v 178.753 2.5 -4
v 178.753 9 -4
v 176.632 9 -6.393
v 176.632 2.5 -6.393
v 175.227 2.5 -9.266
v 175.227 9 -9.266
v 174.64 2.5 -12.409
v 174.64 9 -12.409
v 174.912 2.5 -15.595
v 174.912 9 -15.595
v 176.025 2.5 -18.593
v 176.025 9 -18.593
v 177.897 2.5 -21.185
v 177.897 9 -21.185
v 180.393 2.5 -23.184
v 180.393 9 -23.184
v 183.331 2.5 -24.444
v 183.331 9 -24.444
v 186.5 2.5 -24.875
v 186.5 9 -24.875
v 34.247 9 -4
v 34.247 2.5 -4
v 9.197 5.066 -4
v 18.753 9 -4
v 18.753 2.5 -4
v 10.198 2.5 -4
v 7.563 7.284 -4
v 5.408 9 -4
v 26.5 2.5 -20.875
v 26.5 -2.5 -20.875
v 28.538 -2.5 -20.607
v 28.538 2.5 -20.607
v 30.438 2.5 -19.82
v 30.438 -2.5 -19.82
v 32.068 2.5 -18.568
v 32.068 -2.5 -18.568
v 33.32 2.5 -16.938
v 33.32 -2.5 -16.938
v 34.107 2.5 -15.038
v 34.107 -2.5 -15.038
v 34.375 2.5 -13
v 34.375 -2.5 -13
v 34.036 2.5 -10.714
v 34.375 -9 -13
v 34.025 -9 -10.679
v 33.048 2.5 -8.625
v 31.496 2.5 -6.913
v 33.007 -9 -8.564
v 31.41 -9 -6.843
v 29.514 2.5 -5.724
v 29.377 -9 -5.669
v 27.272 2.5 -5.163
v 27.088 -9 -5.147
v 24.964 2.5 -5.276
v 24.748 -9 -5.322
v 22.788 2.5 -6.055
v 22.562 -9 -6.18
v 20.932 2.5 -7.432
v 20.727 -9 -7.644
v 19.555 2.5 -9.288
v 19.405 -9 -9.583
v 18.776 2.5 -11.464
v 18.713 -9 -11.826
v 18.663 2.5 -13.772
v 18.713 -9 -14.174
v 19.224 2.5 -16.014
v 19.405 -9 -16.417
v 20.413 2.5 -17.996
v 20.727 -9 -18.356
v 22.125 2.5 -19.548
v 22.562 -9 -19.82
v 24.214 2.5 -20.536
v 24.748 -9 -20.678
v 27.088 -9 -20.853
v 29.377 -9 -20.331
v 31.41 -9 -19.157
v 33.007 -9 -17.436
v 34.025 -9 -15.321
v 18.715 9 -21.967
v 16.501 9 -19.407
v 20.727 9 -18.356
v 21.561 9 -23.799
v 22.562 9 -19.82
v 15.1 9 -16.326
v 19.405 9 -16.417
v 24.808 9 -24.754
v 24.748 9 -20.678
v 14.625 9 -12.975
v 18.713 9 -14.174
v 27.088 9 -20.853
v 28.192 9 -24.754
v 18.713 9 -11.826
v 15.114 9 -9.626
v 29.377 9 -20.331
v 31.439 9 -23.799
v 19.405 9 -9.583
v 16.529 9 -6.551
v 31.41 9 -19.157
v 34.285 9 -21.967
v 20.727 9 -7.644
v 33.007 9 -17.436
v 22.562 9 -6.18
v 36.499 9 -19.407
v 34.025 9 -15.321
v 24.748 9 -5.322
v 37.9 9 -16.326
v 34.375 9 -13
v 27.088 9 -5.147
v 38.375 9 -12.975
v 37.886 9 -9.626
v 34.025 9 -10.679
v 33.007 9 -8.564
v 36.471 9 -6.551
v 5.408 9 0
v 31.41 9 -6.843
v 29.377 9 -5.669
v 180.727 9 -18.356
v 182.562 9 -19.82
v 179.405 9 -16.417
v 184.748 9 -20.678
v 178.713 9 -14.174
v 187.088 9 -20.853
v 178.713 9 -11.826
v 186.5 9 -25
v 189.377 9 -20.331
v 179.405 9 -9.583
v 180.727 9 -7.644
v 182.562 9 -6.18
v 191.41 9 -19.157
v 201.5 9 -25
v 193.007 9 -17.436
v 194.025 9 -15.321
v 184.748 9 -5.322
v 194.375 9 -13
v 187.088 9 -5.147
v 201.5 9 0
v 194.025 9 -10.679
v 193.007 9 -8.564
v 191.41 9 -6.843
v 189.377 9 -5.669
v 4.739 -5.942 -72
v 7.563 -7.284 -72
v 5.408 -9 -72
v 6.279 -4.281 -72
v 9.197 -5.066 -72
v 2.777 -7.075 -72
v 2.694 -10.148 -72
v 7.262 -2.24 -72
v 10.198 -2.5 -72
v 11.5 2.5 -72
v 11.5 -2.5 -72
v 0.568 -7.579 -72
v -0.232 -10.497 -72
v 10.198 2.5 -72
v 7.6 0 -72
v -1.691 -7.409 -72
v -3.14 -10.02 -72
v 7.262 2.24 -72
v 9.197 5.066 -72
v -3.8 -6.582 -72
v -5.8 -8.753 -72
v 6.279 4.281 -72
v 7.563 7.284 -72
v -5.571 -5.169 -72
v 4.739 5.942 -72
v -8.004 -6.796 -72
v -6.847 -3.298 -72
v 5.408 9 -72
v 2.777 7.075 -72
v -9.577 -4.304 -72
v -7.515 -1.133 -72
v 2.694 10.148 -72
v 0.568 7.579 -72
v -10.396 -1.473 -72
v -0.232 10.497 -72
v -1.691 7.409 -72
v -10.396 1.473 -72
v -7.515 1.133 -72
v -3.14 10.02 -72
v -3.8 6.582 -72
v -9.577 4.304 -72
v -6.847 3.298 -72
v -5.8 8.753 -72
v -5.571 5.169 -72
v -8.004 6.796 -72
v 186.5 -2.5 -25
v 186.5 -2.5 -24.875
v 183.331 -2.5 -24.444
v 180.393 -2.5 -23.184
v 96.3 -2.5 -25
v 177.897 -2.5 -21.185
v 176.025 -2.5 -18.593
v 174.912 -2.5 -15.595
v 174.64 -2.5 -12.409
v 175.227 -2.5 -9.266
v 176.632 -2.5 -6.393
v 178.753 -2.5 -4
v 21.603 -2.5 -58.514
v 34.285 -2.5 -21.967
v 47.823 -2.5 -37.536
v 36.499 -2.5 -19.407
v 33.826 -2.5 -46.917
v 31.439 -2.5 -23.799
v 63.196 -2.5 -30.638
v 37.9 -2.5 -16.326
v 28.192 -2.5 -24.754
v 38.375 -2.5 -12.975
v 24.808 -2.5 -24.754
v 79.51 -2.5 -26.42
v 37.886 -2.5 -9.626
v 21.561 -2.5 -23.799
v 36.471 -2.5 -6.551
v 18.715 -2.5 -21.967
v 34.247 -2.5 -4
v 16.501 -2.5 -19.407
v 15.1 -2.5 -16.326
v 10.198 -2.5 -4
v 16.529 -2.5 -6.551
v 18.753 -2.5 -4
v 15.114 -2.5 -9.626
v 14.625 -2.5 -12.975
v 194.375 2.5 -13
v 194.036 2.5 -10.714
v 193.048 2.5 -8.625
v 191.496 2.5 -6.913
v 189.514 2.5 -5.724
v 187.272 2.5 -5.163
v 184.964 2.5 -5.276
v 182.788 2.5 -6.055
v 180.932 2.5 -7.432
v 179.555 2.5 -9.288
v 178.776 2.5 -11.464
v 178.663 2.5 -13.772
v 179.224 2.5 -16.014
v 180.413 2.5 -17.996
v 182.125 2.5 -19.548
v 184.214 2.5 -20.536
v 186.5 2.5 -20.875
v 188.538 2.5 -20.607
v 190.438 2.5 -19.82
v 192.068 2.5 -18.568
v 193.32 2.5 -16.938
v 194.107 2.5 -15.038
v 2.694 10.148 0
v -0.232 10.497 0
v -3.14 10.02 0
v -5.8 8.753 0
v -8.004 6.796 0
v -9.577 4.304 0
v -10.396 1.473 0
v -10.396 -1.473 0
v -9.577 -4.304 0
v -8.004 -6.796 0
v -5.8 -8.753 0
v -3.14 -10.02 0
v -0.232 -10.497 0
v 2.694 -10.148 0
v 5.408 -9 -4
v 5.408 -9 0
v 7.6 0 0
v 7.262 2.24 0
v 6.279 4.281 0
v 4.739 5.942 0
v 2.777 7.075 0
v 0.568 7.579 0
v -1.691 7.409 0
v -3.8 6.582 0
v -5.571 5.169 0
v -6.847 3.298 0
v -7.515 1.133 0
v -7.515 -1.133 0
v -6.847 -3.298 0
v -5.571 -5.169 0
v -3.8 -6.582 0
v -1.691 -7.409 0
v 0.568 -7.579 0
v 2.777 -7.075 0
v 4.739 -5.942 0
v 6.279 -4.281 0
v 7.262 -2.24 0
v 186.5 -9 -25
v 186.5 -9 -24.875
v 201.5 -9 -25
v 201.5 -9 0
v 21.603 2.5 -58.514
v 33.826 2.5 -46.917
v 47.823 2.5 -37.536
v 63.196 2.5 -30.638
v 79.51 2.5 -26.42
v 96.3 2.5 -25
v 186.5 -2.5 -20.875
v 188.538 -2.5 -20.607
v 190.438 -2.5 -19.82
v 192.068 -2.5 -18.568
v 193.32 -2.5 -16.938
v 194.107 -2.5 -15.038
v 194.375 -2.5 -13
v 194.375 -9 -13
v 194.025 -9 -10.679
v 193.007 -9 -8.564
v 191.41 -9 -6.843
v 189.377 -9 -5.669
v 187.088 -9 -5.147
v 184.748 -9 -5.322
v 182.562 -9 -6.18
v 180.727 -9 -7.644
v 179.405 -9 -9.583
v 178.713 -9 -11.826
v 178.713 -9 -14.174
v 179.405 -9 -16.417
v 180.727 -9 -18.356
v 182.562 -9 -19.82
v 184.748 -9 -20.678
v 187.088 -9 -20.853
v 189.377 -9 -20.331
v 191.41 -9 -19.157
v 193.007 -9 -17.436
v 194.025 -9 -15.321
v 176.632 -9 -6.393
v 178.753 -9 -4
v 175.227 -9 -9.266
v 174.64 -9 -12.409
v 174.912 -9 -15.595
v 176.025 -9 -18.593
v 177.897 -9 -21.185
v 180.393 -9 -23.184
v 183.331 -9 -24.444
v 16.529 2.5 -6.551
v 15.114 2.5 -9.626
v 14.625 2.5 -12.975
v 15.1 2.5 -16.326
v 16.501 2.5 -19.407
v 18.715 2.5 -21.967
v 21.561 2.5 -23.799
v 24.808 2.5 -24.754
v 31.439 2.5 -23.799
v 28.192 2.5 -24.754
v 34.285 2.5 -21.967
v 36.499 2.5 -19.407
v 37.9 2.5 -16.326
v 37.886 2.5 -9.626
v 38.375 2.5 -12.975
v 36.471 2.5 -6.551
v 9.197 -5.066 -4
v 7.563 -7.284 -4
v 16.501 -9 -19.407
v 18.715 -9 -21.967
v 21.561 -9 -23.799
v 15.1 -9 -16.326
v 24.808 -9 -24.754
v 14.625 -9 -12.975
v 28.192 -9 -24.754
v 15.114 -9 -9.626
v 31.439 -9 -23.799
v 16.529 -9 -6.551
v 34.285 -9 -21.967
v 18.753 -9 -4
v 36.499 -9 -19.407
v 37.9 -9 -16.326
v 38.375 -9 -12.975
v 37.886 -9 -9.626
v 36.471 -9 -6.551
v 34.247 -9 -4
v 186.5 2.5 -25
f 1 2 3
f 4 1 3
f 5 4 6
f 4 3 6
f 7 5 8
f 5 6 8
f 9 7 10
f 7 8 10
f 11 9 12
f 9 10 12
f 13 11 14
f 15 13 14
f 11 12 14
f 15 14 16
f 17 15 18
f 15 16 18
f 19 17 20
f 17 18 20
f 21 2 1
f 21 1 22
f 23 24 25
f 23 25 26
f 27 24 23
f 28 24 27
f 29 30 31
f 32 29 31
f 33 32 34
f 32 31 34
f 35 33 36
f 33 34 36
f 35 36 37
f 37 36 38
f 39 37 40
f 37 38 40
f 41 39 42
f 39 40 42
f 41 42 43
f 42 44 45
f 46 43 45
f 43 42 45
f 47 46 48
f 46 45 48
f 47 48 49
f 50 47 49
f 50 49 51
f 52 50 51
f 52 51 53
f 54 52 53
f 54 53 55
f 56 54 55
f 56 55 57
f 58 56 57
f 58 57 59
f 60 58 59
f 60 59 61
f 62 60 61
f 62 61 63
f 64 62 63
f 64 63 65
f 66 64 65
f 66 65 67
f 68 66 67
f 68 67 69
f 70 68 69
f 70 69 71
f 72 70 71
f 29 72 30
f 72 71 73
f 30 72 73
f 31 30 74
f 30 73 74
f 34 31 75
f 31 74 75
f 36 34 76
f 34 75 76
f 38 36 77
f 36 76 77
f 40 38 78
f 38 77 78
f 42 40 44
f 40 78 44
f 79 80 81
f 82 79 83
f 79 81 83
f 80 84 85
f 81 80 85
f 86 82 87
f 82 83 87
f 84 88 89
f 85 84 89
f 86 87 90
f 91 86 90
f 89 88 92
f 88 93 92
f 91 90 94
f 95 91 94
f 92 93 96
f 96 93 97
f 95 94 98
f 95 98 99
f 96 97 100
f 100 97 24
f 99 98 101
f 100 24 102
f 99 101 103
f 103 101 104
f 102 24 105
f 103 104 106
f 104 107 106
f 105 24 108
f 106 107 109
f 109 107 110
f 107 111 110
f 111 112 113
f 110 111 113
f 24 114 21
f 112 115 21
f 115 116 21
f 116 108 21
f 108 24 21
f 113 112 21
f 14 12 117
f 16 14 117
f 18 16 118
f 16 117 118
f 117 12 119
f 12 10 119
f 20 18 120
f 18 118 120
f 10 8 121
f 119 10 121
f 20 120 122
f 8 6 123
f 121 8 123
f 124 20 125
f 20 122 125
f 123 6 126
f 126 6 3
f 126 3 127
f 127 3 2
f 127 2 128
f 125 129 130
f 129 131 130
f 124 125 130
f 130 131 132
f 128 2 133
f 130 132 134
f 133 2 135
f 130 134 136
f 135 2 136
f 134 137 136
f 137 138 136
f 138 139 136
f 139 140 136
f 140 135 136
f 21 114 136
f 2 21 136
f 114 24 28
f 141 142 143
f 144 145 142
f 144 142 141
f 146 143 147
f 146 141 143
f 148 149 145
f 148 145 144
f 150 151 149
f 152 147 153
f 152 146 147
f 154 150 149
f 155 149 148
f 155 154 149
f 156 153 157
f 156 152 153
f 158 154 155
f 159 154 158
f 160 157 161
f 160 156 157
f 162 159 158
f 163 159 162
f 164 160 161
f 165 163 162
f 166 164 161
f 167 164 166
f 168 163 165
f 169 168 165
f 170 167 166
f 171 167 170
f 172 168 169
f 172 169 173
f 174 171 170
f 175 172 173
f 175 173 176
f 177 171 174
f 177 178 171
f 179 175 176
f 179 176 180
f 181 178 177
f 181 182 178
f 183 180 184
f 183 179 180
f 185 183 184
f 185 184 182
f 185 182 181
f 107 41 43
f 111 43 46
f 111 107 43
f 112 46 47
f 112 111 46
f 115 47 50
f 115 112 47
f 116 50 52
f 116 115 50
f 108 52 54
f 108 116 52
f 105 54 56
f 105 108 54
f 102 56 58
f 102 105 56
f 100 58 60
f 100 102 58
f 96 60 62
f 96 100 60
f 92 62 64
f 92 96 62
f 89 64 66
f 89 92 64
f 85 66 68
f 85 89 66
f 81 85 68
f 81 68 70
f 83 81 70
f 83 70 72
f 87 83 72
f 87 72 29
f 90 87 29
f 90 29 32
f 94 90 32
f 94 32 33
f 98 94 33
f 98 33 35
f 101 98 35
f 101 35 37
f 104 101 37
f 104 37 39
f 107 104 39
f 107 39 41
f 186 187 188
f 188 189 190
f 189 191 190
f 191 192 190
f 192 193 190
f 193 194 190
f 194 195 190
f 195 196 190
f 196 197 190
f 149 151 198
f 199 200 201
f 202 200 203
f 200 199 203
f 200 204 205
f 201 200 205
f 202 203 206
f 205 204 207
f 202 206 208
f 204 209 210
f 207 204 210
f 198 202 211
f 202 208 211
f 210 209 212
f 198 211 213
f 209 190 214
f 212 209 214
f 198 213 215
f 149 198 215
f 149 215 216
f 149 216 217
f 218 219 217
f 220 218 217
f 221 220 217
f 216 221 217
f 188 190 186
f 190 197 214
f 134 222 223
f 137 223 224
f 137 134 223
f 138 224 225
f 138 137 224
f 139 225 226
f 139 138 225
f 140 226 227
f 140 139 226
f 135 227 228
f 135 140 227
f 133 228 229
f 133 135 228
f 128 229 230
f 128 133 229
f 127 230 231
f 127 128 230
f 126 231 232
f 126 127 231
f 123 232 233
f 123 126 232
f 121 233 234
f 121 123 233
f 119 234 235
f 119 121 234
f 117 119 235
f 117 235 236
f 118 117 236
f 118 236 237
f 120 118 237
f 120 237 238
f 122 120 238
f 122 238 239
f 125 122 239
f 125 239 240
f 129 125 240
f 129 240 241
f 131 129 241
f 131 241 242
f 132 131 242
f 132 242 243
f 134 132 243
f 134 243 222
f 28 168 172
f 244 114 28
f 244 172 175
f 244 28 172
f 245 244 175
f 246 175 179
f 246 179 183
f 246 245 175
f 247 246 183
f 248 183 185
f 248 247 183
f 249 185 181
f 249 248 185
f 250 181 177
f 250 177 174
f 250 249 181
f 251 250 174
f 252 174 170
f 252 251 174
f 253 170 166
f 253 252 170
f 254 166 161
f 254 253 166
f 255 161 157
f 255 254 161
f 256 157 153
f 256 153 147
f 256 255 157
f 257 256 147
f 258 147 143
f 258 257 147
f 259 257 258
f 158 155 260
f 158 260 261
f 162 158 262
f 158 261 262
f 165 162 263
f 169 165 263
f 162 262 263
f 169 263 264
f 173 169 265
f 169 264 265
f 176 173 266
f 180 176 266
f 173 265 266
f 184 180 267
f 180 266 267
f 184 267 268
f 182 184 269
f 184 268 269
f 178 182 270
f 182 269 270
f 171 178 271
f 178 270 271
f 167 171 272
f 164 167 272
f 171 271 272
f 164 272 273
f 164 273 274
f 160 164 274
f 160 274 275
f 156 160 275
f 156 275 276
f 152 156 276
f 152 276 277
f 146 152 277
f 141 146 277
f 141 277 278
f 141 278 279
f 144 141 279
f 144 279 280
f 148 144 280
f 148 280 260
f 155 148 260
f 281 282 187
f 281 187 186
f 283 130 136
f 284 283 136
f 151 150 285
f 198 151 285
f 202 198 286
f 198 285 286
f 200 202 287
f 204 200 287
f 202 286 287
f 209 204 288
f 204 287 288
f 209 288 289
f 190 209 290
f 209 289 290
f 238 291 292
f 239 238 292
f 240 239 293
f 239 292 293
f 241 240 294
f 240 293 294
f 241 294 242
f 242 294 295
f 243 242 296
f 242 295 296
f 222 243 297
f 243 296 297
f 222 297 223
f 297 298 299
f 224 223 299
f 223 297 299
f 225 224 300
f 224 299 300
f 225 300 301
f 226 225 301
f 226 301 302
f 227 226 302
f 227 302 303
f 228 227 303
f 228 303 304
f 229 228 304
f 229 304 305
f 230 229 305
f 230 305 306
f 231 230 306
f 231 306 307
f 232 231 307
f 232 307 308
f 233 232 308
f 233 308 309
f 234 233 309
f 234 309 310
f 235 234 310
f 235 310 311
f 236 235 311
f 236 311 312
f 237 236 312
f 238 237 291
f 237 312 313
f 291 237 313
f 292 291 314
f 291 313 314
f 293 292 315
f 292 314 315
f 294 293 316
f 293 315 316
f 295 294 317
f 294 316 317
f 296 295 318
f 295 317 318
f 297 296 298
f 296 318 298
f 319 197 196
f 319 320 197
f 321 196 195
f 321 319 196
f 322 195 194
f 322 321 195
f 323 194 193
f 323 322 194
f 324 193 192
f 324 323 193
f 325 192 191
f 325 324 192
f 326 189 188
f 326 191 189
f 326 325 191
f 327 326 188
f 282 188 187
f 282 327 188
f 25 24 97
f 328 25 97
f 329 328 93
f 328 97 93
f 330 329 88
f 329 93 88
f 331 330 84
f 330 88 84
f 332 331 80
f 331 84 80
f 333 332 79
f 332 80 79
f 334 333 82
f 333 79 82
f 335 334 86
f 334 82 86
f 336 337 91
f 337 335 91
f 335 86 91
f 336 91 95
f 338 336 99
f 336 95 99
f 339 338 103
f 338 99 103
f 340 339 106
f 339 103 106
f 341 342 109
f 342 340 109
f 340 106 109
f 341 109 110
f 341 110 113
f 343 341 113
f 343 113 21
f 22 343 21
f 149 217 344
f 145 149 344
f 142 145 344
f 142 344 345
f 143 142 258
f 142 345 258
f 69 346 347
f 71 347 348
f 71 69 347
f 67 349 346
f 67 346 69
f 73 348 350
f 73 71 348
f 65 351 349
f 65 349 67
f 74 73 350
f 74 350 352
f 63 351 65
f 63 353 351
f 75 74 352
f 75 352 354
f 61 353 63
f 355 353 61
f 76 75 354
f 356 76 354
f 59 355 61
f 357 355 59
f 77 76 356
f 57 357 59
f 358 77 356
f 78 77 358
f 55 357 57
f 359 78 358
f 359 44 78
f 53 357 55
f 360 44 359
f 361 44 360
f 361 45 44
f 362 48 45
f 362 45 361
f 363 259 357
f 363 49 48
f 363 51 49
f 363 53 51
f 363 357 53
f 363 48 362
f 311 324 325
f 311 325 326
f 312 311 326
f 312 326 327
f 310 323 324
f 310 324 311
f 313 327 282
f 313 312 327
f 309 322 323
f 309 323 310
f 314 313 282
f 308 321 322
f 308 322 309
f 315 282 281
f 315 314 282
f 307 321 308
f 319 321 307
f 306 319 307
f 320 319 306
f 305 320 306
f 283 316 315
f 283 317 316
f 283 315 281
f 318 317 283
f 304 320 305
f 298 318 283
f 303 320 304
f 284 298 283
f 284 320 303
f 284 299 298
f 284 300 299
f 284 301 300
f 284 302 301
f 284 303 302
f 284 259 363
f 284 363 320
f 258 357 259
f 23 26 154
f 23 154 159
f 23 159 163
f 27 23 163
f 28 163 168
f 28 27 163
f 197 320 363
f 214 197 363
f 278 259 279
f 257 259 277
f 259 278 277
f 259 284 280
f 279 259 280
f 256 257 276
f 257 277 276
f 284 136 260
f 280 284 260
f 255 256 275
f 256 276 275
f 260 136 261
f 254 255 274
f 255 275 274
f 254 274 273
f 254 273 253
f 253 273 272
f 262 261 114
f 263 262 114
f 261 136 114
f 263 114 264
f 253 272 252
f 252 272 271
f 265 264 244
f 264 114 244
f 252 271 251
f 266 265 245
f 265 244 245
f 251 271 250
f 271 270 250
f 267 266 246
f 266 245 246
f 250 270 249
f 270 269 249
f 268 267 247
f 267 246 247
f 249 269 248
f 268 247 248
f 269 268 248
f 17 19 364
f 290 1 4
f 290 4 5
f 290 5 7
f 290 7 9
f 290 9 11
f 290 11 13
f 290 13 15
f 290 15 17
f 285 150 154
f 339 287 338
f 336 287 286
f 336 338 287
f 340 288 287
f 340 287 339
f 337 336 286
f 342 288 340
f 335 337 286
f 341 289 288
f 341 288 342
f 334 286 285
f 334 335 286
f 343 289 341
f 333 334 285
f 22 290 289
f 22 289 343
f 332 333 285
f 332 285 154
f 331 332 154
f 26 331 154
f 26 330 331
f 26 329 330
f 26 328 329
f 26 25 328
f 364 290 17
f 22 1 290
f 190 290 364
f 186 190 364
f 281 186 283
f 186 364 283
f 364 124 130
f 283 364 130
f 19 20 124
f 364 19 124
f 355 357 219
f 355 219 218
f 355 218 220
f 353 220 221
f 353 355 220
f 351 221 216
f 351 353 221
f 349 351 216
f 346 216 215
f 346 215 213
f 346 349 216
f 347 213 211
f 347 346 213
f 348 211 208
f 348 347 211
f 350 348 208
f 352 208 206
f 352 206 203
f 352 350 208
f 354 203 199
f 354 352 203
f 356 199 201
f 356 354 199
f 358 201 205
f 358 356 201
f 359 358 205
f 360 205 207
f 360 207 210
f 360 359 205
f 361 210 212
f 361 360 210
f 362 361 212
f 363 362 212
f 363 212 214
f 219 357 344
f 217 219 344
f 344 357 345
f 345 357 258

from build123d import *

# Parameters (mm, degrees)
SKETCH1_R           = 10.5
BOSS_EXTRUDE1_DEPTH = 72
SKETCH2_R           = 7.6
CUT_EXTRUDE5_DEPTH  = 74.515304529
BOSS_EXTRUDE2_DEPTH = 72
CUT_EXTRUDE2_START  = -68
CUT_EXTRUDE2_DEPTH  = 68
CUT_EXTRUDE3_DEPTH  = 215.371756535
SKETCH6_R           = 7.875
CUT_EXTRUDE4_DEPTH  = 215.371756535
EXTRUDE_THIN1_START = 6.5
SKETCH7_R           = 11.875
SKETCH7_R_2         = 7.875
EXTRUDE_THIN1_DEPTH = 6.5
BOSS_EXTRUDE3_START = 6.5
BOSS_EXTRUDE3_DEPTH = 6.5


with BuildPart() as part:
    # Sketch1 → Boss-Extrude1 (new body)
    with BuildSketch(Plane.XY):
        Circle(SKETCH1_R)
    extrude(amount=-BOSS_EXTRUDE1_DEPTH)

    # Sketch2 → Cut-Extrude5 (cut, through all)
    with BuildSketch(Plane.XY):
        Circle(SKETCH2_R)
    extrude(amount=-CUT_EXTRUDE5_DEPTH, mode=Mode.SUBTRACT)

    # Sketch3 → Boss-Extrude2 (add)
    with BuildSketch(Plane.XY):
        with BuildLine():
            Line((5.408326913, 9), (201.5, 9))
            Line((201.5, 9), (201.5, -9))
            Line((201.5, -9), (5.408326913, -9))
            ThreePointArc((5.408326913, -9), (10.5, 0), (5.408326913, 9))
        make_face()
    extrude(amount=-BOSS_EXTRUDE2_DEPTH)

    # Sketch4 → Cut-Extrude2 (cut)
    with BuildSketch(Plane(origin=(0, 0, -72), x_dir=(-1, 0, 0), z_dir=(0, 0, -1)).offset(CUT_EXTRUDE2_START)):
        with BuildLine():
            Line((-201.5, 9), (-201.5, 2.5))
            Line((-201.5, 2.5), (-10.198039027, 2.5))
            ThreePointArc((-10.198039027, 2.5), (-8.452938215, 6.228790856), (-5.408326913, 9))
            Line((-5.408326913, 9), (-201.5, 9))
        make_face()
    cut_extrude2 = extrude(amount=CUT_EXTRUDE2_DEPTH, mode=Mode.SUBTRACT)

    # Mirror1: Cut-Extrude2 across plane
    add(cut_extrude2.mirror(Plane.ZX), mode=Mode.SUBTRACT)

    # Sketch5 → Cut-Extrude3 (cut, through all)
    with BuildSketch(Plane(origin=(0, 2.5, 0), x_dir=(1, 0, 0), z_dir=(0, 1, 0))):
        with BuildLine():
            Line((96.299764151, 25), (201.5, 25))
            Line((201.5, 25), (201.5, 72))
            Line((201.5, 72), (11.5, 72))
            ThreePointArc((11.5, 72), (47.822965576, 37.535721577), (96.299764151, 25))
        make_face()
    extrude(amount=-CUT_EXTRUDE3_DEPTH, mode=Mode.SUBTRACT)

    # Sketch6 → Cut-Extrude4 (cut, through all)
    with BuildSketch(Plane.XZ.offset(2.5)):
        with Locations(Location((186.5, -13, 0), (0, 0, 270))):
            Circle(SKETCH6_R)
        with Locations(Location((26.5, -13, 0), (0, 0, 270))):
            Circle(SKETCH6_R)
    extrude(amount=-CUT_EXTRUDE4_DEPTH, mode=Mode.SUBTRACT)

    # Sketch7 → Extrude-Thin1 (add)
    # profile 1 of 2: a face of its own
    with BuildSketch(Plane.XZ.offset(2.5).offset(EXTRUDE_THIN1_START)):
        with Locations((26.5, -13)):
            Circle(SKETCH7_R)
        with Locations((26.5, -13)):
            Circle(SKETCH7_R_2, mode=Mode.SUBTRACT)
    # profile 2 of 2: a face of its own
    with BuildSketch(Plane.XZ.offset(2.5).offset(EXTRUDE_THIN1_START)):
        with Locations((186.5, -13)):
            Circle(SKETCH7_R)
        with Locations((186.5, -13)):
            Circle(SKETCH7_R_2, mode=Mode.SUBTRACT)
    extrude_thin1 = extrude(amount=-EXTRUDE_THIN1_DEPTH)

    # Sketch8 → Boss-Extrude3 (add)
    with BuildSketch(Plane.XZ.offset(2.5).offset(BOSS_EXTRUDE3_START)):
        with BuildLine():
            Line((201.5, -4), (194.246975216, -4))
            ThreePointArc((194.246975216, -4), (197.633072914, -17.13162347), (186.5, -24.875))
            Line((186.5, -24.875), (186.5, -25))
            Line((186.5, -25), (201.5, -25))
            Line((201.5, -25), (201.5, -4))
        make_face()
    boss_extrude3 = extrude(amount=-BOSS_EXTRUDE3_DEPTH)

    # Mirror2: Extrude-Thin1, Boss-Extrude3 across plane
    add(extrude_thin1.mirror(Plane.ZX))
    add(boss_extrude3.mirror(Plane.ZX))


solid = part.part
